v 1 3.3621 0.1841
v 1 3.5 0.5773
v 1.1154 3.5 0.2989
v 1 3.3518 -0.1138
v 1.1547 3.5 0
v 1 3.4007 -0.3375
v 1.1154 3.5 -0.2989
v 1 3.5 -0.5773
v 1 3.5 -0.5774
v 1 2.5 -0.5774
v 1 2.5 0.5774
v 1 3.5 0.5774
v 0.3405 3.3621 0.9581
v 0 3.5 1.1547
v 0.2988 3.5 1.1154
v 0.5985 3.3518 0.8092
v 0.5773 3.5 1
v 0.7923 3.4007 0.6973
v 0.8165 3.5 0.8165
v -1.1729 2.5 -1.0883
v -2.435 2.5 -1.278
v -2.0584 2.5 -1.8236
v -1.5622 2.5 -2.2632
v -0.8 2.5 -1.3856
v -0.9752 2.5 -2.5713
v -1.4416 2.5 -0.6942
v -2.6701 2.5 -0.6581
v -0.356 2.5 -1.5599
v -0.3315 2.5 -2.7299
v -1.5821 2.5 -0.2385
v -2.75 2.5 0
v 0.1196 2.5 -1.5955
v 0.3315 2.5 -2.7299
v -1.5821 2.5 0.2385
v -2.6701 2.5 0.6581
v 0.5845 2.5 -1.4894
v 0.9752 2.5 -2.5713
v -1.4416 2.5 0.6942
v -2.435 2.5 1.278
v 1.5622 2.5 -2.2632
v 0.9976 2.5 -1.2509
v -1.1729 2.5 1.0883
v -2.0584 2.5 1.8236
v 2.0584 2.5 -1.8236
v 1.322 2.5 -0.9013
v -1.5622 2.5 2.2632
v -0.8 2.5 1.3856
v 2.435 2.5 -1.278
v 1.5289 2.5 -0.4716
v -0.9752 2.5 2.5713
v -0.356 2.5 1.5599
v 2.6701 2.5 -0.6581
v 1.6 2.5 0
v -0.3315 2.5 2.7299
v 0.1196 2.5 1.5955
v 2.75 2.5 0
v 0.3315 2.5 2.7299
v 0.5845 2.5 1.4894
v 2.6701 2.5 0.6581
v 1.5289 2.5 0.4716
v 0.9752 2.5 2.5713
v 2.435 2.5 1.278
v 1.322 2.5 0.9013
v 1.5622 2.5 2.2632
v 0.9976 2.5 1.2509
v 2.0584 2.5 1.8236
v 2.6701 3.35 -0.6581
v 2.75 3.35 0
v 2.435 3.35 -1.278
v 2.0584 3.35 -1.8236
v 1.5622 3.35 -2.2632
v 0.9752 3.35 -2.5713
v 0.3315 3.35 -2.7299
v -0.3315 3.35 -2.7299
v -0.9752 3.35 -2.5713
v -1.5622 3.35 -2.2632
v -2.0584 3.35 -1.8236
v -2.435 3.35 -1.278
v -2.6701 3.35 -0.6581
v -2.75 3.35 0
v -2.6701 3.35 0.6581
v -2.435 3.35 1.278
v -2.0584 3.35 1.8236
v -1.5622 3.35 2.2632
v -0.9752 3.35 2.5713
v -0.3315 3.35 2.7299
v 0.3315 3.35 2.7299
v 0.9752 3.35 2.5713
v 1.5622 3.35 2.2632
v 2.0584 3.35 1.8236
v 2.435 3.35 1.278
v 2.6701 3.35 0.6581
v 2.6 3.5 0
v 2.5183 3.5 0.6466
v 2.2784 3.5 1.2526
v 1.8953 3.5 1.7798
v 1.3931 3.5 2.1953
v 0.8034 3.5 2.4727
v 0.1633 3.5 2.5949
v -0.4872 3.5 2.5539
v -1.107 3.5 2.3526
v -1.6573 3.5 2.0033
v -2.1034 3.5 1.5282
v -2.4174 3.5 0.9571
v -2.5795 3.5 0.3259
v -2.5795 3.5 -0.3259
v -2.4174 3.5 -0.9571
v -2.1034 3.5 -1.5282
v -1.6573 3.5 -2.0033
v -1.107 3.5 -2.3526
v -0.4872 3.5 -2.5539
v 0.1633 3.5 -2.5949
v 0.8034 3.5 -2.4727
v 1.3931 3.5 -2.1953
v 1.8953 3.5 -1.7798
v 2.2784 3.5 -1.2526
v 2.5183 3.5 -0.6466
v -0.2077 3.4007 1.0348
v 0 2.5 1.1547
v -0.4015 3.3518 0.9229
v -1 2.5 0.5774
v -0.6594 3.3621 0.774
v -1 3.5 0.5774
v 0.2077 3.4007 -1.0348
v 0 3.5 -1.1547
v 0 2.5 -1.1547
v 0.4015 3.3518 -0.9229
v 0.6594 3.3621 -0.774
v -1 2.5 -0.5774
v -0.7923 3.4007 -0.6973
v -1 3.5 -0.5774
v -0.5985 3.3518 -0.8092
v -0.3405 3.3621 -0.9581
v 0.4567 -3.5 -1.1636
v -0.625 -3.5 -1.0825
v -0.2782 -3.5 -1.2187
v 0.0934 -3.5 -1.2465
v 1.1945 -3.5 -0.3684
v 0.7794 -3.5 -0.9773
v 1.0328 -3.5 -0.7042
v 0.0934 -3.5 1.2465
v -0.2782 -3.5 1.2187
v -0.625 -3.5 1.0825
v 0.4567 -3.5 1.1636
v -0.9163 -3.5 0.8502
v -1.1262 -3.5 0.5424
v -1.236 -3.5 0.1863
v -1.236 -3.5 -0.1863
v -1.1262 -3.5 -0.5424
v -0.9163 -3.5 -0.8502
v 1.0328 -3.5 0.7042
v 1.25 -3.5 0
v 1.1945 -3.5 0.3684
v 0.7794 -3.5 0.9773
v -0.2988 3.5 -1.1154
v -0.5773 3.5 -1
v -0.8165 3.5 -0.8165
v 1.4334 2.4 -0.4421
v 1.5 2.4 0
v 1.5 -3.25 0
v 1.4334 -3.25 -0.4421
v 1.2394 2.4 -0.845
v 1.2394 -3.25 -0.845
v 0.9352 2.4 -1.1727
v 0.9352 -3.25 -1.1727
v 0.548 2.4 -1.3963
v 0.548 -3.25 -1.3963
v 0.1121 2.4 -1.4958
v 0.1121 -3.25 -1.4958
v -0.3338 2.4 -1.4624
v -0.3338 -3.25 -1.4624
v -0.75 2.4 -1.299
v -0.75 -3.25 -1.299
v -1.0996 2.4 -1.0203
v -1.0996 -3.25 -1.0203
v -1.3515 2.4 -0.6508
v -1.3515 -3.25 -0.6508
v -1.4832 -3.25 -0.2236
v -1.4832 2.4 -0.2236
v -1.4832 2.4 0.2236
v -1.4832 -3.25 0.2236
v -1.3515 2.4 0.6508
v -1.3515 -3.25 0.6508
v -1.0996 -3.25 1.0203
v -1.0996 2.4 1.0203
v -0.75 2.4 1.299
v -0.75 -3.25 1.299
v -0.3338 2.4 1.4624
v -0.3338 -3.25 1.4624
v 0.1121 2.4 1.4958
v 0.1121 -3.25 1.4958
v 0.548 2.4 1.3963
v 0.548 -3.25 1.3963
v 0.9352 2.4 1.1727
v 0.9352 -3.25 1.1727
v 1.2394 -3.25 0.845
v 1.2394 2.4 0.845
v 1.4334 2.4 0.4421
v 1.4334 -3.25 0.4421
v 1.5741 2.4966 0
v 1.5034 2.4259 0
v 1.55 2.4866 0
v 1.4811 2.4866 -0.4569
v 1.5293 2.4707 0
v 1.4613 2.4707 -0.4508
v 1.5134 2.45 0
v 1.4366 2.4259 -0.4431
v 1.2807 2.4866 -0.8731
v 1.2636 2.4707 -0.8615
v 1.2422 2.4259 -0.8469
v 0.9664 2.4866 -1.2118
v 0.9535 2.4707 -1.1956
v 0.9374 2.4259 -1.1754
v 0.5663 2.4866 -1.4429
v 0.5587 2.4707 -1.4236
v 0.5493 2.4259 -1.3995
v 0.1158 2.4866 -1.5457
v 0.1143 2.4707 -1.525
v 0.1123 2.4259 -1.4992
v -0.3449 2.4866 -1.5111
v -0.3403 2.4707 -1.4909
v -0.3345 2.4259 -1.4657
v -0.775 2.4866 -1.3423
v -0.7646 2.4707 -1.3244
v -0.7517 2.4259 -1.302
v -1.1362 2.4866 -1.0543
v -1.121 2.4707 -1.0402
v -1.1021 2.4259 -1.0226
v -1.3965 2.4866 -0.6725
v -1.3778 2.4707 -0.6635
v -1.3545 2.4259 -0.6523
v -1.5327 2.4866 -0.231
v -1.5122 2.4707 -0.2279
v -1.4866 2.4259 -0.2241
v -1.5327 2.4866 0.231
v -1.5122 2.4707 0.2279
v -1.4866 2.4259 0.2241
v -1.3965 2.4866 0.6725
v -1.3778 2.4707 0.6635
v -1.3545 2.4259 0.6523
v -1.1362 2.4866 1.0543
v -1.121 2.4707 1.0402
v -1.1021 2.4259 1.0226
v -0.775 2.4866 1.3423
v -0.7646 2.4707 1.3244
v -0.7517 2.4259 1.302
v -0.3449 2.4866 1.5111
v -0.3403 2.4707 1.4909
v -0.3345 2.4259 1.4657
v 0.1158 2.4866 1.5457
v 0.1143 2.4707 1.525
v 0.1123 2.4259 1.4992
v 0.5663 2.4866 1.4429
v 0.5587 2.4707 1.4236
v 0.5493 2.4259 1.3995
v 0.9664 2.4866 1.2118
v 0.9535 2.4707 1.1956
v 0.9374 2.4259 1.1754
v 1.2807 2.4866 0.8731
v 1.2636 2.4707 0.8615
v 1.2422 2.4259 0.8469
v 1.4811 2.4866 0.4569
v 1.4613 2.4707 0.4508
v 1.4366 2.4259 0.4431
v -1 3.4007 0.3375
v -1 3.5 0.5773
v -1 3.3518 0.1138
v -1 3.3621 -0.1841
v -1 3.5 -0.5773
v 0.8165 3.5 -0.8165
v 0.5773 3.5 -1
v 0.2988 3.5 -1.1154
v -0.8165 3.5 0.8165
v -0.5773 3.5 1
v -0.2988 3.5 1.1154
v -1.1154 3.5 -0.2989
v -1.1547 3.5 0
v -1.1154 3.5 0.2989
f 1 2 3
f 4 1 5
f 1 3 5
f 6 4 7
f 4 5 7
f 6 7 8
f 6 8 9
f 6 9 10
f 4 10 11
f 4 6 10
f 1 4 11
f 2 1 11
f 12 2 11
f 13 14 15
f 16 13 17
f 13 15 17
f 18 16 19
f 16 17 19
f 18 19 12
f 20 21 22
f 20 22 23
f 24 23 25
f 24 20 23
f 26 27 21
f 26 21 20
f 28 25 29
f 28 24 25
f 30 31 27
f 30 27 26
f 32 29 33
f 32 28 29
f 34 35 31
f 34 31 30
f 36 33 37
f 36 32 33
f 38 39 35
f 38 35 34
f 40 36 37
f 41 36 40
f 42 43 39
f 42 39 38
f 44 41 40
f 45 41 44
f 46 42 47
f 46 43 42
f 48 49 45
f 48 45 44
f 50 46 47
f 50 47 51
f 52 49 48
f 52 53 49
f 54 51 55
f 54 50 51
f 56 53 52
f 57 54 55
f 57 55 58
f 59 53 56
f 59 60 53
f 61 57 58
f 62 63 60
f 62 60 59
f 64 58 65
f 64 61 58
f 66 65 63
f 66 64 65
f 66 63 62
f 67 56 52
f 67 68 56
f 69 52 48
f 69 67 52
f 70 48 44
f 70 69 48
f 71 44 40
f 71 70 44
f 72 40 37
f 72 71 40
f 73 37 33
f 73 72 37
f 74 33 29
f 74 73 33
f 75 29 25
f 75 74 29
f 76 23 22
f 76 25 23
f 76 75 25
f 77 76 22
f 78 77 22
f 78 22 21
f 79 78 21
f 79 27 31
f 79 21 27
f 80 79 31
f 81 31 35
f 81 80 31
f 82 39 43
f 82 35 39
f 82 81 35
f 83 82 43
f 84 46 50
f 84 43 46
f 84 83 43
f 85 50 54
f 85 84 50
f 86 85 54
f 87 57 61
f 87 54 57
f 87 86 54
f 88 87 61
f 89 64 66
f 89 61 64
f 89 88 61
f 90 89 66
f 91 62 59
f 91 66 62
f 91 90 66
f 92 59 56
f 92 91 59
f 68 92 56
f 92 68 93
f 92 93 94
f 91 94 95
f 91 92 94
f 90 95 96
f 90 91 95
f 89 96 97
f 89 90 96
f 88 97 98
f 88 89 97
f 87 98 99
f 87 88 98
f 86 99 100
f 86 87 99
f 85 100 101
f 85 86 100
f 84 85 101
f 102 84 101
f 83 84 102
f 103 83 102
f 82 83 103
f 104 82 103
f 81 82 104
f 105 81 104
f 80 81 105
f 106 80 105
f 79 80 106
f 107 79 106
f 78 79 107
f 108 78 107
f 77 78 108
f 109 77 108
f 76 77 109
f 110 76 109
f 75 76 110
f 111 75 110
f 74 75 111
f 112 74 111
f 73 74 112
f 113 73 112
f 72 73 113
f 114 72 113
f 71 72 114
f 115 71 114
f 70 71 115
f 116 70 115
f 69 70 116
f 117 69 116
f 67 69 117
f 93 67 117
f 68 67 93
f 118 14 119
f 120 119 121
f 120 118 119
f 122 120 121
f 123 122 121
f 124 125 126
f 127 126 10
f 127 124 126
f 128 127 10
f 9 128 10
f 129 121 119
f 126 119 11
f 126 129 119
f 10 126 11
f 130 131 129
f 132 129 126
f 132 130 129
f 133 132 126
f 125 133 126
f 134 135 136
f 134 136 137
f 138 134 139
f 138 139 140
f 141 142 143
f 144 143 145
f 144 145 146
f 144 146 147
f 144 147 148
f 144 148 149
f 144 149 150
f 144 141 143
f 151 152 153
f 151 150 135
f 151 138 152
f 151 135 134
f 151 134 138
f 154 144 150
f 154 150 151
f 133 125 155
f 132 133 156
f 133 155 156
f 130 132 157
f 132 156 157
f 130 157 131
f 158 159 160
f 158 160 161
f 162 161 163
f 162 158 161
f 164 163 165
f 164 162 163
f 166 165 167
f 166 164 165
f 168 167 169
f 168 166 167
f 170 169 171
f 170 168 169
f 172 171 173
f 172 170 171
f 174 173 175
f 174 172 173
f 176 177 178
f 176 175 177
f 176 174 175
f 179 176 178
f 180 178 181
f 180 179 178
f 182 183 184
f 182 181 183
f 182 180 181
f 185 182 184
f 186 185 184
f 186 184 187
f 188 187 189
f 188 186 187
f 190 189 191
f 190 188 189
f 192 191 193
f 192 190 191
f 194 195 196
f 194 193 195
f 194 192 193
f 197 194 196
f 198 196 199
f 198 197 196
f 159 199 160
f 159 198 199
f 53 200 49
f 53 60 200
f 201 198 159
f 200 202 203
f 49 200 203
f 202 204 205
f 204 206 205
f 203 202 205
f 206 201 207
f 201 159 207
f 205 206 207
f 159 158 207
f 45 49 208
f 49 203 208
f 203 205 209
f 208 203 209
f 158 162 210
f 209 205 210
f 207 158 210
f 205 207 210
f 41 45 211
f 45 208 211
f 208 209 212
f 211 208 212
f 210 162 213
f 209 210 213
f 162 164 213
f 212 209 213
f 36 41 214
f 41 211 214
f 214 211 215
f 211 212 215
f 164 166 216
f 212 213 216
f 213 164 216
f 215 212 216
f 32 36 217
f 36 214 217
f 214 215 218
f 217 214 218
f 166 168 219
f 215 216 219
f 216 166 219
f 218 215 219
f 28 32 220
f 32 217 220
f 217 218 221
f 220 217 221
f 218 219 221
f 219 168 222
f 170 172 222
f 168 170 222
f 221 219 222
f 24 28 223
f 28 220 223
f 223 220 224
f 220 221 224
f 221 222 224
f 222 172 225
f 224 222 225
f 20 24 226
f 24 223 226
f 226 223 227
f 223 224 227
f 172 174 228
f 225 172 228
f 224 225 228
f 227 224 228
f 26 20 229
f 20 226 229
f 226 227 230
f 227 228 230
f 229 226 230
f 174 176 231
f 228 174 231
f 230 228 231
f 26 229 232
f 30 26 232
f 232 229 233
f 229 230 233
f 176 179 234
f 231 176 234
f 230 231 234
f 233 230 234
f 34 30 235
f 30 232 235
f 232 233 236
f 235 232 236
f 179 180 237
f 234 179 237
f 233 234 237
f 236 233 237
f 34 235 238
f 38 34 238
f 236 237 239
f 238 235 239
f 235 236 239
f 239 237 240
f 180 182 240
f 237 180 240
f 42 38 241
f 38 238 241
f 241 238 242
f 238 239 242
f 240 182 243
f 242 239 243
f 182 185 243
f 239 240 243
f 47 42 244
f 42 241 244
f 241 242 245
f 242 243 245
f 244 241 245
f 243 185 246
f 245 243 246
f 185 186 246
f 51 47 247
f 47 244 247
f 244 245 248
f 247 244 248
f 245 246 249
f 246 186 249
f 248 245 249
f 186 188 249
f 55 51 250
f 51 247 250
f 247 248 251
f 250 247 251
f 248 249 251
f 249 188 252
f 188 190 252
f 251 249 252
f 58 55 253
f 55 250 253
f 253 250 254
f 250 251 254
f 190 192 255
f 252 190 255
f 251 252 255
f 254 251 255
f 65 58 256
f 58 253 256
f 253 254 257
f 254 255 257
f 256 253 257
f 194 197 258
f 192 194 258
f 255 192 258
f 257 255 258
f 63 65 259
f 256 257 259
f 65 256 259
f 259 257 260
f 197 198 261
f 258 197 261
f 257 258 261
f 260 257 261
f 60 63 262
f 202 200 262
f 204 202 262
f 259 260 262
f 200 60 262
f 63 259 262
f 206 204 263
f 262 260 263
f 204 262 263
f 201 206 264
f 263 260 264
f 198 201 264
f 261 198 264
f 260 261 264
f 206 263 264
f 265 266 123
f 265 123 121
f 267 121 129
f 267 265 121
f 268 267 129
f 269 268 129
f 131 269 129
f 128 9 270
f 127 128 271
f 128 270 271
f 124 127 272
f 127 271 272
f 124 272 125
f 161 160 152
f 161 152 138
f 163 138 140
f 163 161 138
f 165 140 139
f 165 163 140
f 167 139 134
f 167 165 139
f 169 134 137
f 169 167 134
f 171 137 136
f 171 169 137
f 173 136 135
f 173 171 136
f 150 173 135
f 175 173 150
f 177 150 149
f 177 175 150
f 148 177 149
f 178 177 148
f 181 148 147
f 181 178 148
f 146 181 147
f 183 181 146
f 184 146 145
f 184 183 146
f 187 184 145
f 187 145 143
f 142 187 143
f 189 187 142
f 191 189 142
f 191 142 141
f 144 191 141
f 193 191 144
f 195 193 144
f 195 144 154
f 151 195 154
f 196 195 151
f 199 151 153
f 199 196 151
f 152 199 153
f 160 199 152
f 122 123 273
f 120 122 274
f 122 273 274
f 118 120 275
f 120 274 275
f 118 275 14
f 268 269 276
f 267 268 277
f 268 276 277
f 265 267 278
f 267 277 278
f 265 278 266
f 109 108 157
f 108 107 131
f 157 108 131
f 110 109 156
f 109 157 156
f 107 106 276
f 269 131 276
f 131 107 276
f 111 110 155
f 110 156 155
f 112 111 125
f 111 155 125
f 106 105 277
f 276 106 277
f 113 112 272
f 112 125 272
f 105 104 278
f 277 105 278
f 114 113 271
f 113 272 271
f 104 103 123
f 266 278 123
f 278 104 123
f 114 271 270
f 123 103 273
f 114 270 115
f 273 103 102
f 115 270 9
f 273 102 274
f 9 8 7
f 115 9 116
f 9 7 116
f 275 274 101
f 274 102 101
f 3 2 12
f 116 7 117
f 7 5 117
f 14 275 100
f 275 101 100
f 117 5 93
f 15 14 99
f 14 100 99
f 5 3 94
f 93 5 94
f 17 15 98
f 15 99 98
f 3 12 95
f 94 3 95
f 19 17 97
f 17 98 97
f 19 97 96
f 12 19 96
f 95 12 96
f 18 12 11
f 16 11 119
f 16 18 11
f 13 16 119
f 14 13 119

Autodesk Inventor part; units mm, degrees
ref_plane "YZ Plane" through (0, 0, 0) normal (1, 0, 0) x (0, 1, 0)
ref_plane "XZ Plane" through (0, 0, 0) normal (0, 1, 0) x (-1, 0, 0)
ref_plane "XY Plane" through (0, 0, 0) normal (0, 0, 1) x (1, 0, 0)
sketch "Sketch1" plane through (0, 0, 0) normal (0, 0, 1) x (1, 0, 0)
  line L0 (0, 3.5) -> (0, -3.5)
  line L1 (0, -3.5) -> (1.25, -3.5)
  line L2 (1.25, -3.5) -> (1.5, -3.25)
  line L3 (1.5, -3.25) -> (1.5, 2.4)
  line L4 (1.6, 2.5) -> (2.75, 2.5)
  line L5 (2.75, 2.5) -> (2.75, 3.35)
  line L6 (2.6, 3.5) -> (0, 3.5)
  arc A0 (1.6, 2.5) -> (1.5, 2.4) centre (1.6, 2.4) ccw
  line L7 (2.6, 3.5) -> (2.75, 3.35)
  point P0 (0, 0)
  point P1 (2.75, 3.5)
  point P2 (0, 0)
  dimension "d0" = 5.5
  dimension "d1" = 1
  dimension "d3" = 3
  dimension "d4" = 3.2
  dimension "d5" = 135
  dimension "d6" = 0.25
  dimension "d7" = 6
  dimension "d18" = 0.15
  dimension "d22" = 0.15
revolve "Revolution1" add sketch "Sketch1" angle 360 about axis through (0, 3.5, 0) along (0, -1, 0)
sketch "Sketch2" plane through (0, 3.5, 0) normal (0, 1, 0) x (1, 0, 0)
  line L0 (0, -1.1547) -> (-1, -0.5774)
  line L1 (-1, -0.5774) -> (-1, 0.5774)
  line L2 (-1, 0.5774) -> (0, 1.1547)
  line L3 (0, 1.1547) -> (1, 0.5774)
  line L4 (1, 0.5774) -> (1, -0.5774)
  line L5 (1, -0.5774) -> (0, -1.1547)
  point P0 (0, 0)
  point P1 (0, 0)
  dimension "d11" = 2
extrude "Extrusion1" cut sketch "Sketch2" against normal blind 1
thread "Thread1" size "M3x0.5" class "6g" standard "ANSI Metric M Profile" full length
sketch "Sketch3" plane through (0, 0, 0) normal (1, 0, 0) x (0, 1, 0)
  line L0 (3.5, 1.1547) -> (3.5, 0.5774) projected
  line L1 (3.5, 1.1547) -> (3, 0.6547)
  line L2 (3, 0.6547) -> (3.5, 0.6547)
  line L3 (3.5, 0.6547) -> (3.5, 1.1547)
  line L4 (-0.9, 0) -> (5.4, 0) projected
  point P0 (0, 0)
  dimension "d16" = 0.5
revolve "Revolution2" cut sketch "Sketch3" angle 360 about axis through (0, -10, 0) along (0, 1, 0)
equation "\"d22\" = d18"
properties part number "48-0362" material "Stainless Steel"
